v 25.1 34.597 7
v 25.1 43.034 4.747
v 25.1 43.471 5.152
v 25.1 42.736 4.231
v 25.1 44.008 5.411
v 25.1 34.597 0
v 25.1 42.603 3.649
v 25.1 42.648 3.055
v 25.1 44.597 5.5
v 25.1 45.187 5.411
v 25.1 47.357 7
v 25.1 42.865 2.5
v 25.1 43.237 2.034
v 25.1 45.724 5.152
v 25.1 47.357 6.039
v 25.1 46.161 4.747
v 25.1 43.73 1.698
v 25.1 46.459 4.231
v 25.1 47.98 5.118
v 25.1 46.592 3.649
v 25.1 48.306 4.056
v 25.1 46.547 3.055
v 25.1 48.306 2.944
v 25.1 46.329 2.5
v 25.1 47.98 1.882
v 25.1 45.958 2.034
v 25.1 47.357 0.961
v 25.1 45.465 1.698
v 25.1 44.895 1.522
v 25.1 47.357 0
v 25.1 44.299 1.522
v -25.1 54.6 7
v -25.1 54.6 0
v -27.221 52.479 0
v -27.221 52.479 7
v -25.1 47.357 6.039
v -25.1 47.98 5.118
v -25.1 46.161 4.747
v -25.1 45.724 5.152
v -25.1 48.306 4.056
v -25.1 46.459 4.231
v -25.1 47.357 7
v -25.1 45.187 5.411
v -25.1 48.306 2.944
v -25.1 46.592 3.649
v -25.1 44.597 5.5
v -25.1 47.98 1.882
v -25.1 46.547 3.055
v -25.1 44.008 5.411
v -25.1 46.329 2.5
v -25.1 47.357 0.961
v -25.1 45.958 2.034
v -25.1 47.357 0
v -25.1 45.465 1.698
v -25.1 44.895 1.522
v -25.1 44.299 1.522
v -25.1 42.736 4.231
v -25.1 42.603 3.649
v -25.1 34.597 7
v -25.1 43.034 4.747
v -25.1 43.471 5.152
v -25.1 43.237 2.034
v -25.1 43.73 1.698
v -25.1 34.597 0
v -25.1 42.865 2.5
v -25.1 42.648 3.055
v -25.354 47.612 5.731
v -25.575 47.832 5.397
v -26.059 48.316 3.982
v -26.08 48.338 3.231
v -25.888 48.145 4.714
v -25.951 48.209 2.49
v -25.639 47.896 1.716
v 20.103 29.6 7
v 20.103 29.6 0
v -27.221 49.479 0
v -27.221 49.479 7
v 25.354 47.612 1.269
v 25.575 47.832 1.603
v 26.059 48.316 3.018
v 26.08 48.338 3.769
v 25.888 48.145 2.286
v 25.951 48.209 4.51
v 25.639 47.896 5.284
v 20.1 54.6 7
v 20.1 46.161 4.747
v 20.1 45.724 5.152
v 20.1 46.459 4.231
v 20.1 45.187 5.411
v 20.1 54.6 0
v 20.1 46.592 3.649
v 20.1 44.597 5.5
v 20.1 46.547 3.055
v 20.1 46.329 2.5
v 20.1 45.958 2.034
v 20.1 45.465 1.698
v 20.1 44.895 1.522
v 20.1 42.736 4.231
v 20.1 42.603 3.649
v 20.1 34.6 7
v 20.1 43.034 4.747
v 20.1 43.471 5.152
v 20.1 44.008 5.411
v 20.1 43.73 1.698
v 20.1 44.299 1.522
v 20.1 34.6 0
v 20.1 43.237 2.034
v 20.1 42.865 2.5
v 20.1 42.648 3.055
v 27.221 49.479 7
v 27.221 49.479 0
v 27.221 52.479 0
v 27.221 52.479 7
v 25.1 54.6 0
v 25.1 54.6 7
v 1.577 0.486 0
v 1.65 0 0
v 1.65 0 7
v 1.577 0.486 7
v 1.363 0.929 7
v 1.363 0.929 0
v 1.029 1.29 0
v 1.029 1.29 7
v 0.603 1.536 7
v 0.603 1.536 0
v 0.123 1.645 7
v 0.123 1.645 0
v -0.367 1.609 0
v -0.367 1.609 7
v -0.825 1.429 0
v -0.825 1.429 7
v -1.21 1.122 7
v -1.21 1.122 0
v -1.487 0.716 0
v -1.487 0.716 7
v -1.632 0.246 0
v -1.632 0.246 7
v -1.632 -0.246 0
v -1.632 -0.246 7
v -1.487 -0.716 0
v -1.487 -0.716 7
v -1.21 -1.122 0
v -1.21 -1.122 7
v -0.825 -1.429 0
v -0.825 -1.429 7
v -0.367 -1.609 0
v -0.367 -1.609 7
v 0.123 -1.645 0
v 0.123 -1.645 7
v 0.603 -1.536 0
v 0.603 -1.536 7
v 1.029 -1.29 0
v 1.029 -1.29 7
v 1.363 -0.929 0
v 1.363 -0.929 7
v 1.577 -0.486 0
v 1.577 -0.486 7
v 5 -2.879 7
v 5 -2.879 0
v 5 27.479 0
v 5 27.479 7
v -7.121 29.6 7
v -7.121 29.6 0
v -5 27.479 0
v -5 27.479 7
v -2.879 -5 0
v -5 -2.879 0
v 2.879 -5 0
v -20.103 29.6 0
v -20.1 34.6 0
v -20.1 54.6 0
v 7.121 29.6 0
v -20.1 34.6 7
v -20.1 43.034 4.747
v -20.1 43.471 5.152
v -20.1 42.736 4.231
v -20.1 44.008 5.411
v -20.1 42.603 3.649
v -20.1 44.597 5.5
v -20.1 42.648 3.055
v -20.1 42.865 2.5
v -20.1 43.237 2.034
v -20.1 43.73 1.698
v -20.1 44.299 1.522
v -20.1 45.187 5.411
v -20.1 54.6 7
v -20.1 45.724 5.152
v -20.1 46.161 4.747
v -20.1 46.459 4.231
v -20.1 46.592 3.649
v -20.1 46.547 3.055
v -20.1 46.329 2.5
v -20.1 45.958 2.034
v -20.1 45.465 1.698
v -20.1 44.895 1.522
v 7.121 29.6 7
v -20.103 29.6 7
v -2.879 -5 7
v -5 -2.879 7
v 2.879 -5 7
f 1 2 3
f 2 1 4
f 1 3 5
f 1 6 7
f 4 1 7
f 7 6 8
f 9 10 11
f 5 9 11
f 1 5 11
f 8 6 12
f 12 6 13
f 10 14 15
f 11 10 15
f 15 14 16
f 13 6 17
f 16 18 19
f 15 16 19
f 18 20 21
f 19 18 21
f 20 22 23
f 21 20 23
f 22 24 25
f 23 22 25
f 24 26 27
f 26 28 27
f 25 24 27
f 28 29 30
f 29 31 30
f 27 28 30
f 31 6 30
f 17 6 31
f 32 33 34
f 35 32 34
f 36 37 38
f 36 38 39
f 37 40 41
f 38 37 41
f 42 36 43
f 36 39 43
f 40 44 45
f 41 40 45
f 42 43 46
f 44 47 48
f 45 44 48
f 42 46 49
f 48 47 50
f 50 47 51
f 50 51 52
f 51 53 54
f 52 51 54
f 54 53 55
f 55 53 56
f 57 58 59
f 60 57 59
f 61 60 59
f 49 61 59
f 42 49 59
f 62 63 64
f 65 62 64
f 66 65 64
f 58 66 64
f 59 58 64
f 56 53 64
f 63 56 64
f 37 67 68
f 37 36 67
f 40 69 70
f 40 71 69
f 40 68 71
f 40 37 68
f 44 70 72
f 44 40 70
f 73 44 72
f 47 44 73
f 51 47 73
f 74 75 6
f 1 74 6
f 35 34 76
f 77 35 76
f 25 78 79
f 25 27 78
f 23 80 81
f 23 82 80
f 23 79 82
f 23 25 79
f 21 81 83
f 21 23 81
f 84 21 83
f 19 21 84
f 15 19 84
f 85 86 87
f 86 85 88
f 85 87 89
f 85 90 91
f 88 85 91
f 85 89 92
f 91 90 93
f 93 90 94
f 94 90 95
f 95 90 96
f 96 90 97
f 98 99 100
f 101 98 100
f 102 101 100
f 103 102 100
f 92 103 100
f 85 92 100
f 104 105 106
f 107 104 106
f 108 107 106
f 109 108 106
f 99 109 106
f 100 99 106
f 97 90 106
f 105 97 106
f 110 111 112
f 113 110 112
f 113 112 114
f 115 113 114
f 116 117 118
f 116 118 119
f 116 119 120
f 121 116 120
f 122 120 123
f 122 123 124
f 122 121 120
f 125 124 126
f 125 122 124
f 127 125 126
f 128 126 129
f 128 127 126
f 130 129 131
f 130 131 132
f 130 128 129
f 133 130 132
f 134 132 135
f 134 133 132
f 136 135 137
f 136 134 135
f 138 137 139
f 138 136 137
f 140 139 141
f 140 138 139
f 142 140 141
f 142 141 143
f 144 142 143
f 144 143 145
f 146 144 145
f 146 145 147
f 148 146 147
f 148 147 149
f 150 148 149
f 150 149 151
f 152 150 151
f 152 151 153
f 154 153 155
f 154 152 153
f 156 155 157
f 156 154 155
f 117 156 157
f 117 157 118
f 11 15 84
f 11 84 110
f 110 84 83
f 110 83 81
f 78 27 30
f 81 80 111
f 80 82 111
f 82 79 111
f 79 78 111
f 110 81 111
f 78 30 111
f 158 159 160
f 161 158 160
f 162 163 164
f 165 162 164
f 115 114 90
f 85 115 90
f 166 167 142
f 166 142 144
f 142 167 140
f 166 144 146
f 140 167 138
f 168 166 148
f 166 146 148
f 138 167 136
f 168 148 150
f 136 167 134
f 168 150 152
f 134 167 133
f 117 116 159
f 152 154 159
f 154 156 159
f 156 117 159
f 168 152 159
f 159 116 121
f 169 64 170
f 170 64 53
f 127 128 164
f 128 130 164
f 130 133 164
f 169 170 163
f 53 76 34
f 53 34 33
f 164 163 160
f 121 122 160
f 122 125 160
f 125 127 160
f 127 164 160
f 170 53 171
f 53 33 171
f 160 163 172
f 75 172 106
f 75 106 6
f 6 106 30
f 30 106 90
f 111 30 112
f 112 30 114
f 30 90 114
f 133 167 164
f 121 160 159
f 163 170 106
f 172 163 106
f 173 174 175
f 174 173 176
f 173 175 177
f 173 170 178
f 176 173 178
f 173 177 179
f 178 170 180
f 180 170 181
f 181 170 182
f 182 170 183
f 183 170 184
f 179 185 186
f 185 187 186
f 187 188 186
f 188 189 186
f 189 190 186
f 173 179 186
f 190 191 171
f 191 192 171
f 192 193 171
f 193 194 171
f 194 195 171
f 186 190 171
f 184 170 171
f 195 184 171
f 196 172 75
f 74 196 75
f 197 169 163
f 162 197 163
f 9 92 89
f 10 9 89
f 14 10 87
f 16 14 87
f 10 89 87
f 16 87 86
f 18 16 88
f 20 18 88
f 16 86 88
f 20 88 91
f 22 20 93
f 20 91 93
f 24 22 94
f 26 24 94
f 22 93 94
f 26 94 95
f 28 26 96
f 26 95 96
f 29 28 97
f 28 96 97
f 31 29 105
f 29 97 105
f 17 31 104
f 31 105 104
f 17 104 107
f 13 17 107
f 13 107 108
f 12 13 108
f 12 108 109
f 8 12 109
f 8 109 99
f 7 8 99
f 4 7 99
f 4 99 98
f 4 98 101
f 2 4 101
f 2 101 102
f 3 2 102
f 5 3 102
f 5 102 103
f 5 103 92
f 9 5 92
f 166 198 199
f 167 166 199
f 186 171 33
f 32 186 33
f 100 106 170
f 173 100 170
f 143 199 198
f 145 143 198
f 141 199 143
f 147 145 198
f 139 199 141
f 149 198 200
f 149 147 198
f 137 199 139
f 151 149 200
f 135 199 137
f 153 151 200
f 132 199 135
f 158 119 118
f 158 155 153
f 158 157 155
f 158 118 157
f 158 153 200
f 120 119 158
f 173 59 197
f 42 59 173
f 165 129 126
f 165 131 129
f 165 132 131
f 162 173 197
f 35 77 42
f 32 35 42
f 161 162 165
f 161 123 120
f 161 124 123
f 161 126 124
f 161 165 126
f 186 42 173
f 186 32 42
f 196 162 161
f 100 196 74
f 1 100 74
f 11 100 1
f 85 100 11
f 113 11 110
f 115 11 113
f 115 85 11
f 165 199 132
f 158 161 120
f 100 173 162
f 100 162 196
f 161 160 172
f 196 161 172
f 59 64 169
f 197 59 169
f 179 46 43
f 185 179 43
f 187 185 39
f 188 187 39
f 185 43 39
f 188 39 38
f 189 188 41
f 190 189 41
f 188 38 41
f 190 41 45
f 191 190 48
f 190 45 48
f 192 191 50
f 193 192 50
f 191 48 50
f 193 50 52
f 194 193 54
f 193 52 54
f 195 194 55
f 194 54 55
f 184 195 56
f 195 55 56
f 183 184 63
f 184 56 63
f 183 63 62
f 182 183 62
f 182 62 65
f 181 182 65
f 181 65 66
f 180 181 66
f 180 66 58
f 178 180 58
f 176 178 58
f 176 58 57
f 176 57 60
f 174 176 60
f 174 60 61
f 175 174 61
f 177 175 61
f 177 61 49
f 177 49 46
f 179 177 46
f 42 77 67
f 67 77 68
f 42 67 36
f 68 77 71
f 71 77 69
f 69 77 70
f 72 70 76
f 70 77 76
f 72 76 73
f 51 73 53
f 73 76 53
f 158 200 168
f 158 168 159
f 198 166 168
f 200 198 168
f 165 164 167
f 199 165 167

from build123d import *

# Parameters (mm, degrees)
CROQUIS1_R              = 1.65
SALIENTE_EXTRUIR1_DEPTH = 7
CORTAR_EXTRUIR1_DEPTH   = 8
CROQUIS3_R              = 2
CORTAR_EXTRUIR3_DEPTH   = 53.321320344
CROQUIS4_R              = 3.75
CORTAR_EXTRUIR4_DEPTH   = 3.121320344
CROQUIS5_R              = 3.75
CORTAR_EXTRUIR5_DEPTH   = 3.121320344


with BuildPart() as part:
    # Croquis1 → Saliente-Extruir1 (new body)
    with BuildSketch(Plane.XY):
        Polygon((-5, 27.478679656), (-5, -5), (5, -5), (5, 27.478679656), (7.121320344, 29.6), (20.102640687, 29.6), (25.1, 34.597359313), (25.1, 47.357359313), (27.221320344, 49.478679656), (27.221320344, 52.478679656), (25.1, 54.6), (20.1, 54.6), (20.1, 34.6), (-20.1, 34.6), (-20.1, 54.6), (-25.1, 54.6), (-27.221320344, 52.478679656), (-27.221320344, 49.478679656), (-25.1, 47.357359313), (-25.1, 34.597359313), (-20.102640687, 29.6), (-7.121320344, 29.6), align=None)
        Circle(CROQUIS1_R, mode=Mode.SUBTRACT)
    extrude(amount=SALIENTE_EXTRUIR1_DEPTH)

    # Croquis2 → Cortar-Extruir1 (cut, through all)
    with BuildSketch(Plane(origin=(0, 0, 0), x_dir=(-1, 0, 0), z_dir=(0, 0, -1))):
        Polygon((-5, -5), (-2.878679656, -5), (-5, -2.878679656), align=None)
        Polygon((2.878679656, -5), (5, -2.878679656), (5, -5), align=None)
    extrude(amount=-CORTAR_EXTRUIR1_DEPTH, mode=Mode.SUBTRACT)

    # Croquis3 → Cortar-Extruir3 (cut, through all)
    with BuildSketch(Plane.ZY.offset(25.1)):
        with Locations((3.5, 44.597359313)):
            Circle(CROQUIS3_R)
    extrude(amount=-CORTAR_EXTRUIR3_DEPTH, mode=Mode.SUBTRACT)

    # Croquis4 → Cortar-Extruir4 (cut, through all)
    with BuildSketch(Plane.ZY.offset(25.1)):
        with Locations((3.5, 44.597359313)):
            Circle(CROQUIS4_R)
    extrude(amount=CORTAR_EXTRUIR4_DEPTH, mode=Mode.SUBTRACT)

    # Croquis5 → Cortar-Extruir5 (cut, through all)
    with BuildSketch(Plane(origin=(25.1, 0, 0), x_dir=(0, 0, -1), z_dir=(1, 0, 0))):
        with Locations((-3.5, 44.597359313)):
            Circle(CROQUIS5_R)
    extrude(amount=CORTAR_EXTRUIR5_DEPTH, mode=Mode.SUBTRACT)


solid = part.part
